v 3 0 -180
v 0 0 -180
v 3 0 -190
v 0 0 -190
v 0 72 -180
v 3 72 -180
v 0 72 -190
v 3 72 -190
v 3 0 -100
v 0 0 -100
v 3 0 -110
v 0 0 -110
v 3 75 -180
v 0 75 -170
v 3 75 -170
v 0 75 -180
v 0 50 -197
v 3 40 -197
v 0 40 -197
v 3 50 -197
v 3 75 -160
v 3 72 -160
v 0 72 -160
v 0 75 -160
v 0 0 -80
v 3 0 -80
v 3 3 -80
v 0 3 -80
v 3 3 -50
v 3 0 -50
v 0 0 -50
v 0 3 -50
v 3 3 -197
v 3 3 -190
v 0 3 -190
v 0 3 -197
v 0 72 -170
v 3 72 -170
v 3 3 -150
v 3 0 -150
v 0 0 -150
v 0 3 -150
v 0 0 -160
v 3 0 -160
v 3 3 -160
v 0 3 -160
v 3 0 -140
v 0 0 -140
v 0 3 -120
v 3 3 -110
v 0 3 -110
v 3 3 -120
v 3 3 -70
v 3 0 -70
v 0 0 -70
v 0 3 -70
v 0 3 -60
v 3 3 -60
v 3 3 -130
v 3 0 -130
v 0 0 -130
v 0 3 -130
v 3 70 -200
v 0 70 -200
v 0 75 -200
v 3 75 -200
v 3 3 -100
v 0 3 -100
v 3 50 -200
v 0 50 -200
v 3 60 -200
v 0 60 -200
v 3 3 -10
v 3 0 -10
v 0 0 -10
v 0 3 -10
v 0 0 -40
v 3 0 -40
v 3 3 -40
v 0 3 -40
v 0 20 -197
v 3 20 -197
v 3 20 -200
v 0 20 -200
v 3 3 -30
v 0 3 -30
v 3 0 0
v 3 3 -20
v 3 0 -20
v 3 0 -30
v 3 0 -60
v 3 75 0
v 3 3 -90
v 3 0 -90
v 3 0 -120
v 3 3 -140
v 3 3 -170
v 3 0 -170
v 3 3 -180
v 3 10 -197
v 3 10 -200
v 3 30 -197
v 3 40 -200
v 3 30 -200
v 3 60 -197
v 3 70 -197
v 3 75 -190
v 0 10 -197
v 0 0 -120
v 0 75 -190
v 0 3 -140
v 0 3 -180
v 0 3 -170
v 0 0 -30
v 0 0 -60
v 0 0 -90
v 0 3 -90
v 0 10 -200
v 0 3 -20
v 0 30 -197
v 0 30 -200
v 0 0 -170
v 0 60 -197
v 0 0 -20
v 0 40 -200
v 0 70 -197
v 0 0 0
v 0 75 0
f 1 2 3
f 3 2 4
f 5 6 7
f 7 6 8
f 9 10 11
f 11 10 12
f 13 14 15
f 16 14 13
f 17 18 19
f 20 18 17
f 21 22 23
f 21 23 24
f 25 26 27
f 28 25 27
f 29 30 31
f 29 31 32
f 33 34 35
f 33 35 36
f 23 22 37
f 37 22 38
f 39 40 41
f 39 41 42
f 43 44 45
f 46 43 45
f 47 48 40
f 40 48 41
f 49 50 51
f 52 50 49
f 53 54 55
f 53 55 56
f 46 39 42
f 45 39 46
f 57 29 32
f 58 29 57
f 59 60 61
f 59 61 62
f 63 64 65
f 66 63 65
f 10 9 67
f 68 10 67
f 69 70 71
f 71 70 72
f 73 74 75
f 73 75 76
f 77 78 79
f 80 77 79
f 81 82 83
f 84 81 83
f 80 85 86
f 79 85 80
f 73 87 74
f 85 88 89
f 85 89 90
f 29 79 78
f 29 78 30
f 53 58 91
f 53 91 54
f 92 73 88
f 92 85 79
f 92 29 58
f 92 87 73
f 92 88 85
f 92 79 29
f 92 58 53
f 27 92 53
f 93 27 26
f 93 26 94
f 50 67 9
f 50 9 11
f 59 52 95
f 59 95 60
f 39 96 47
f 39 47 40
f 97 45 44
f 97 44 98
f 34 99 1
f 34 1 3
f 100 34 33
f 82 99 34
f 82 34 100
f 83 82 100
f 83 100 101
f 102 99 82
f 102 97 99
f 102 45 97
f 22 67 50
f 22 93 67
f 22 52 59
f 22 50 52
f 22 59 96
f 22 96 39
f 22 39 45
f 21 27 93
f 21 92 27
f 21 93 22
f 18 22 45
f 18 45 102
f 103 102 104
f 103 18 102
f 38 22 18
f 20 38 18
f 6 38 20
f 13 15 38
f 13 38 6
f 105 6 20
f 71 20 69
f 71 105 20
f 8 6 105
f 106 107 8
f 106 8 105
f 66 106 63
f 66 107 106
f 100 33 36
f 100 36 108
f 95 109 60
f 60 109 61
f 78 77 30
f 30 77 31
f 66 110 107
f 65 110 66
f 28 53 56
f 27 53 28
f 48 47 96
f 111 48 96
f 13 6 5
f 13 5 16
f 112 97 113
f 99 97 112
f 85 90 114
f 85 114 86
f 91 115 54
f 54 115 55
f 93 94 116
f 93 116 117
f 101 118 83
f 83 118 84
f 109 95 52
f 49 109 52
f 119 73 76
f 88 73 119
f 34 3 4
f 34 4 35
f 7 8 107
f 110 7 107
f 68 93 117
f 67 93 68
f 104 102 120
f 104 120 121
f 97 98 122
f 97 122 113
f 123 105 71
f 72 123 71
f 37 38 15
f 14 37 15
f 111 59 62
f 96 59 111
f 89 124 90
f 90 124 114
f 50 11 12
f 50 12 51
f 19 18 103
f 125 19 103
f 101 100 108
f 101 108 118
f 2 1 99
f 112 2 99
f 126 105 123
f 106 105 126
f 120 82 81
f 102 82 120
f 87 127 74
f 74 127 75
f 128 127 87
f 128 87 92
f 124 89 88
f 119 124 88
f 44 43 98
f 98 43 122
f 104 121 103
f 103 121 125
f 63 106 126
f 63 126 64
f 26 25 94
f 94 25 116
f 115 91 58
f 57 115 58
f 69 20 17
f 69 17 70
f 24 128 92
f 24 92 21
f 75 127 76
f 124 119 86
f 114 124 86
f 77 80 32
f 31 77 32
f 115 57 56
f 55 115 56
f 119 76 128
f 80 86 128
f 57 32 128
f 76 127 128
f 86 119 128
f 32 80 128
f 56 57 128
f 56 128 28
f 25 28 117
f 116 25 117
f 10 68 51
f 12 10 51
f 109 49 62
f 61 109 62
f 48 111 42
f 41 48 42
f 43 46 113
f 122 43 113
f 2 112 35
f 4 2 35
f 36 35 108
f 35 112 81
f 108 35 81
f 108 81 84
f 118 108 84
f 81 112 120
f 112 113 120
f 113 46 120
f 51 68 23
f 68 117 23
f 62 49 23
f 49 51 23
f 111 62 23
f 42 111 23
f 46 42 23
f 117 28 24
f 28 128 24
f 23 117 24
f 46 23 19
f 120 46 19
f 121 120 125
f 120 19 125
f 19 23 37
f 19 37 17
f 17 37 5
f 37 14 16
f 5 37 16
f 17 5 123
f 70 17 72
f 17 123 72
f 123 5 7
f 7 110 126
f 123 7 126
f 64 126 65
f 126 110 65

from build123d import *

# Parameters (mm, degrees)
MDFESB_W        = 200
MDFESB_H        = 75
MDF_DEPTH       = 3
ENTRADASESB_W   = 10
ENTRADASESB_H   = 3
ENTRADASESB_W_2 = 3
ENTRADASESB_H_2 = 10
ENTRADAS_DEPTH  = 3


with BuildPart() as part:
    # mdfEsb → mdf (new body)
    with BuildSketch(Plane(origin=(0, 0, 0), x_dir=(0, 0, -1), z_dir=(1, 0, 0))):
        with Locations((100, 37.5)):
            Rectangle(MDFESB_W, MDFESB_H)
    extrude(amount=MDF_DEPTH)

    # entradasEsb → Entradas (cut)
    with BuildSketch(Plane(origin=(3, 0, 0), x_dir=(0, 0, -1), z_dir=(1, 0, 0))):
        with Locations((15, 1.5)):
            Rectangle(ENTRADASESB_W, ENTRADASESB_H)
        with Locations((35, 1.5)):
            Rectangle(ENTRADASESB_W, ENTRADASESB_H)
        with Locations((55, 1.5)):
            Rectangle(ENTRADASESB_W, ENTRADASESB_H)
        with Locations((75, 1.5)):
            Rectangle(ENTRADASESB_W, ENTRADASESB_H)
        with Locations((95, 1.5)):
            Rectangle(ENTRADASESB_W, ENTRADASESB_H)
        with Locations((115, 1.5)):
            Rectangle(ENTRADASESB_W, ENTRADASESB_H)
        with Locations((135, 1.5)):
            Rectangle(ENTRADASESB_W, ENTRADASESB_H)
        with Locations((155, 1.5)):
            Rectangle(ENTRADASESB_W, ENTRADASESB_H)
        with Locations((175, 1.5)):
            Rectangle(ENTRADASESB_W, ENTRADASESB_H)
        with Locations((198.5, 25)):
            Rectangle(ENTRADASESB_W_2, ENTRADASESB_H_2)
        with Locations((198.5, 45)):
            Rectangle(ENTRADASESB_W_2, ENTRADASESB_H_2)
        with Locations((198.5, 65)):
            Rectangle(ENTRADASESB_W_2, ENTRADASESB_H_2)
        Polygon((190, 0), (190, 3), (197, 3), (197, 10), (200, 10), (200, 0), align=None)
        with Locations((185, 73.5)):
            Rectangle(ENTRADASESB_W, ENTRADASESB_H)
        with Locations((165, 73.5)):
            Rectangle(ENTRADASESB_W, ENTRADASESB_H)
    extrude(amount=-ENTRADAS_DEPTH, mode=Mode.SUBTRACT)


solid = part.part
